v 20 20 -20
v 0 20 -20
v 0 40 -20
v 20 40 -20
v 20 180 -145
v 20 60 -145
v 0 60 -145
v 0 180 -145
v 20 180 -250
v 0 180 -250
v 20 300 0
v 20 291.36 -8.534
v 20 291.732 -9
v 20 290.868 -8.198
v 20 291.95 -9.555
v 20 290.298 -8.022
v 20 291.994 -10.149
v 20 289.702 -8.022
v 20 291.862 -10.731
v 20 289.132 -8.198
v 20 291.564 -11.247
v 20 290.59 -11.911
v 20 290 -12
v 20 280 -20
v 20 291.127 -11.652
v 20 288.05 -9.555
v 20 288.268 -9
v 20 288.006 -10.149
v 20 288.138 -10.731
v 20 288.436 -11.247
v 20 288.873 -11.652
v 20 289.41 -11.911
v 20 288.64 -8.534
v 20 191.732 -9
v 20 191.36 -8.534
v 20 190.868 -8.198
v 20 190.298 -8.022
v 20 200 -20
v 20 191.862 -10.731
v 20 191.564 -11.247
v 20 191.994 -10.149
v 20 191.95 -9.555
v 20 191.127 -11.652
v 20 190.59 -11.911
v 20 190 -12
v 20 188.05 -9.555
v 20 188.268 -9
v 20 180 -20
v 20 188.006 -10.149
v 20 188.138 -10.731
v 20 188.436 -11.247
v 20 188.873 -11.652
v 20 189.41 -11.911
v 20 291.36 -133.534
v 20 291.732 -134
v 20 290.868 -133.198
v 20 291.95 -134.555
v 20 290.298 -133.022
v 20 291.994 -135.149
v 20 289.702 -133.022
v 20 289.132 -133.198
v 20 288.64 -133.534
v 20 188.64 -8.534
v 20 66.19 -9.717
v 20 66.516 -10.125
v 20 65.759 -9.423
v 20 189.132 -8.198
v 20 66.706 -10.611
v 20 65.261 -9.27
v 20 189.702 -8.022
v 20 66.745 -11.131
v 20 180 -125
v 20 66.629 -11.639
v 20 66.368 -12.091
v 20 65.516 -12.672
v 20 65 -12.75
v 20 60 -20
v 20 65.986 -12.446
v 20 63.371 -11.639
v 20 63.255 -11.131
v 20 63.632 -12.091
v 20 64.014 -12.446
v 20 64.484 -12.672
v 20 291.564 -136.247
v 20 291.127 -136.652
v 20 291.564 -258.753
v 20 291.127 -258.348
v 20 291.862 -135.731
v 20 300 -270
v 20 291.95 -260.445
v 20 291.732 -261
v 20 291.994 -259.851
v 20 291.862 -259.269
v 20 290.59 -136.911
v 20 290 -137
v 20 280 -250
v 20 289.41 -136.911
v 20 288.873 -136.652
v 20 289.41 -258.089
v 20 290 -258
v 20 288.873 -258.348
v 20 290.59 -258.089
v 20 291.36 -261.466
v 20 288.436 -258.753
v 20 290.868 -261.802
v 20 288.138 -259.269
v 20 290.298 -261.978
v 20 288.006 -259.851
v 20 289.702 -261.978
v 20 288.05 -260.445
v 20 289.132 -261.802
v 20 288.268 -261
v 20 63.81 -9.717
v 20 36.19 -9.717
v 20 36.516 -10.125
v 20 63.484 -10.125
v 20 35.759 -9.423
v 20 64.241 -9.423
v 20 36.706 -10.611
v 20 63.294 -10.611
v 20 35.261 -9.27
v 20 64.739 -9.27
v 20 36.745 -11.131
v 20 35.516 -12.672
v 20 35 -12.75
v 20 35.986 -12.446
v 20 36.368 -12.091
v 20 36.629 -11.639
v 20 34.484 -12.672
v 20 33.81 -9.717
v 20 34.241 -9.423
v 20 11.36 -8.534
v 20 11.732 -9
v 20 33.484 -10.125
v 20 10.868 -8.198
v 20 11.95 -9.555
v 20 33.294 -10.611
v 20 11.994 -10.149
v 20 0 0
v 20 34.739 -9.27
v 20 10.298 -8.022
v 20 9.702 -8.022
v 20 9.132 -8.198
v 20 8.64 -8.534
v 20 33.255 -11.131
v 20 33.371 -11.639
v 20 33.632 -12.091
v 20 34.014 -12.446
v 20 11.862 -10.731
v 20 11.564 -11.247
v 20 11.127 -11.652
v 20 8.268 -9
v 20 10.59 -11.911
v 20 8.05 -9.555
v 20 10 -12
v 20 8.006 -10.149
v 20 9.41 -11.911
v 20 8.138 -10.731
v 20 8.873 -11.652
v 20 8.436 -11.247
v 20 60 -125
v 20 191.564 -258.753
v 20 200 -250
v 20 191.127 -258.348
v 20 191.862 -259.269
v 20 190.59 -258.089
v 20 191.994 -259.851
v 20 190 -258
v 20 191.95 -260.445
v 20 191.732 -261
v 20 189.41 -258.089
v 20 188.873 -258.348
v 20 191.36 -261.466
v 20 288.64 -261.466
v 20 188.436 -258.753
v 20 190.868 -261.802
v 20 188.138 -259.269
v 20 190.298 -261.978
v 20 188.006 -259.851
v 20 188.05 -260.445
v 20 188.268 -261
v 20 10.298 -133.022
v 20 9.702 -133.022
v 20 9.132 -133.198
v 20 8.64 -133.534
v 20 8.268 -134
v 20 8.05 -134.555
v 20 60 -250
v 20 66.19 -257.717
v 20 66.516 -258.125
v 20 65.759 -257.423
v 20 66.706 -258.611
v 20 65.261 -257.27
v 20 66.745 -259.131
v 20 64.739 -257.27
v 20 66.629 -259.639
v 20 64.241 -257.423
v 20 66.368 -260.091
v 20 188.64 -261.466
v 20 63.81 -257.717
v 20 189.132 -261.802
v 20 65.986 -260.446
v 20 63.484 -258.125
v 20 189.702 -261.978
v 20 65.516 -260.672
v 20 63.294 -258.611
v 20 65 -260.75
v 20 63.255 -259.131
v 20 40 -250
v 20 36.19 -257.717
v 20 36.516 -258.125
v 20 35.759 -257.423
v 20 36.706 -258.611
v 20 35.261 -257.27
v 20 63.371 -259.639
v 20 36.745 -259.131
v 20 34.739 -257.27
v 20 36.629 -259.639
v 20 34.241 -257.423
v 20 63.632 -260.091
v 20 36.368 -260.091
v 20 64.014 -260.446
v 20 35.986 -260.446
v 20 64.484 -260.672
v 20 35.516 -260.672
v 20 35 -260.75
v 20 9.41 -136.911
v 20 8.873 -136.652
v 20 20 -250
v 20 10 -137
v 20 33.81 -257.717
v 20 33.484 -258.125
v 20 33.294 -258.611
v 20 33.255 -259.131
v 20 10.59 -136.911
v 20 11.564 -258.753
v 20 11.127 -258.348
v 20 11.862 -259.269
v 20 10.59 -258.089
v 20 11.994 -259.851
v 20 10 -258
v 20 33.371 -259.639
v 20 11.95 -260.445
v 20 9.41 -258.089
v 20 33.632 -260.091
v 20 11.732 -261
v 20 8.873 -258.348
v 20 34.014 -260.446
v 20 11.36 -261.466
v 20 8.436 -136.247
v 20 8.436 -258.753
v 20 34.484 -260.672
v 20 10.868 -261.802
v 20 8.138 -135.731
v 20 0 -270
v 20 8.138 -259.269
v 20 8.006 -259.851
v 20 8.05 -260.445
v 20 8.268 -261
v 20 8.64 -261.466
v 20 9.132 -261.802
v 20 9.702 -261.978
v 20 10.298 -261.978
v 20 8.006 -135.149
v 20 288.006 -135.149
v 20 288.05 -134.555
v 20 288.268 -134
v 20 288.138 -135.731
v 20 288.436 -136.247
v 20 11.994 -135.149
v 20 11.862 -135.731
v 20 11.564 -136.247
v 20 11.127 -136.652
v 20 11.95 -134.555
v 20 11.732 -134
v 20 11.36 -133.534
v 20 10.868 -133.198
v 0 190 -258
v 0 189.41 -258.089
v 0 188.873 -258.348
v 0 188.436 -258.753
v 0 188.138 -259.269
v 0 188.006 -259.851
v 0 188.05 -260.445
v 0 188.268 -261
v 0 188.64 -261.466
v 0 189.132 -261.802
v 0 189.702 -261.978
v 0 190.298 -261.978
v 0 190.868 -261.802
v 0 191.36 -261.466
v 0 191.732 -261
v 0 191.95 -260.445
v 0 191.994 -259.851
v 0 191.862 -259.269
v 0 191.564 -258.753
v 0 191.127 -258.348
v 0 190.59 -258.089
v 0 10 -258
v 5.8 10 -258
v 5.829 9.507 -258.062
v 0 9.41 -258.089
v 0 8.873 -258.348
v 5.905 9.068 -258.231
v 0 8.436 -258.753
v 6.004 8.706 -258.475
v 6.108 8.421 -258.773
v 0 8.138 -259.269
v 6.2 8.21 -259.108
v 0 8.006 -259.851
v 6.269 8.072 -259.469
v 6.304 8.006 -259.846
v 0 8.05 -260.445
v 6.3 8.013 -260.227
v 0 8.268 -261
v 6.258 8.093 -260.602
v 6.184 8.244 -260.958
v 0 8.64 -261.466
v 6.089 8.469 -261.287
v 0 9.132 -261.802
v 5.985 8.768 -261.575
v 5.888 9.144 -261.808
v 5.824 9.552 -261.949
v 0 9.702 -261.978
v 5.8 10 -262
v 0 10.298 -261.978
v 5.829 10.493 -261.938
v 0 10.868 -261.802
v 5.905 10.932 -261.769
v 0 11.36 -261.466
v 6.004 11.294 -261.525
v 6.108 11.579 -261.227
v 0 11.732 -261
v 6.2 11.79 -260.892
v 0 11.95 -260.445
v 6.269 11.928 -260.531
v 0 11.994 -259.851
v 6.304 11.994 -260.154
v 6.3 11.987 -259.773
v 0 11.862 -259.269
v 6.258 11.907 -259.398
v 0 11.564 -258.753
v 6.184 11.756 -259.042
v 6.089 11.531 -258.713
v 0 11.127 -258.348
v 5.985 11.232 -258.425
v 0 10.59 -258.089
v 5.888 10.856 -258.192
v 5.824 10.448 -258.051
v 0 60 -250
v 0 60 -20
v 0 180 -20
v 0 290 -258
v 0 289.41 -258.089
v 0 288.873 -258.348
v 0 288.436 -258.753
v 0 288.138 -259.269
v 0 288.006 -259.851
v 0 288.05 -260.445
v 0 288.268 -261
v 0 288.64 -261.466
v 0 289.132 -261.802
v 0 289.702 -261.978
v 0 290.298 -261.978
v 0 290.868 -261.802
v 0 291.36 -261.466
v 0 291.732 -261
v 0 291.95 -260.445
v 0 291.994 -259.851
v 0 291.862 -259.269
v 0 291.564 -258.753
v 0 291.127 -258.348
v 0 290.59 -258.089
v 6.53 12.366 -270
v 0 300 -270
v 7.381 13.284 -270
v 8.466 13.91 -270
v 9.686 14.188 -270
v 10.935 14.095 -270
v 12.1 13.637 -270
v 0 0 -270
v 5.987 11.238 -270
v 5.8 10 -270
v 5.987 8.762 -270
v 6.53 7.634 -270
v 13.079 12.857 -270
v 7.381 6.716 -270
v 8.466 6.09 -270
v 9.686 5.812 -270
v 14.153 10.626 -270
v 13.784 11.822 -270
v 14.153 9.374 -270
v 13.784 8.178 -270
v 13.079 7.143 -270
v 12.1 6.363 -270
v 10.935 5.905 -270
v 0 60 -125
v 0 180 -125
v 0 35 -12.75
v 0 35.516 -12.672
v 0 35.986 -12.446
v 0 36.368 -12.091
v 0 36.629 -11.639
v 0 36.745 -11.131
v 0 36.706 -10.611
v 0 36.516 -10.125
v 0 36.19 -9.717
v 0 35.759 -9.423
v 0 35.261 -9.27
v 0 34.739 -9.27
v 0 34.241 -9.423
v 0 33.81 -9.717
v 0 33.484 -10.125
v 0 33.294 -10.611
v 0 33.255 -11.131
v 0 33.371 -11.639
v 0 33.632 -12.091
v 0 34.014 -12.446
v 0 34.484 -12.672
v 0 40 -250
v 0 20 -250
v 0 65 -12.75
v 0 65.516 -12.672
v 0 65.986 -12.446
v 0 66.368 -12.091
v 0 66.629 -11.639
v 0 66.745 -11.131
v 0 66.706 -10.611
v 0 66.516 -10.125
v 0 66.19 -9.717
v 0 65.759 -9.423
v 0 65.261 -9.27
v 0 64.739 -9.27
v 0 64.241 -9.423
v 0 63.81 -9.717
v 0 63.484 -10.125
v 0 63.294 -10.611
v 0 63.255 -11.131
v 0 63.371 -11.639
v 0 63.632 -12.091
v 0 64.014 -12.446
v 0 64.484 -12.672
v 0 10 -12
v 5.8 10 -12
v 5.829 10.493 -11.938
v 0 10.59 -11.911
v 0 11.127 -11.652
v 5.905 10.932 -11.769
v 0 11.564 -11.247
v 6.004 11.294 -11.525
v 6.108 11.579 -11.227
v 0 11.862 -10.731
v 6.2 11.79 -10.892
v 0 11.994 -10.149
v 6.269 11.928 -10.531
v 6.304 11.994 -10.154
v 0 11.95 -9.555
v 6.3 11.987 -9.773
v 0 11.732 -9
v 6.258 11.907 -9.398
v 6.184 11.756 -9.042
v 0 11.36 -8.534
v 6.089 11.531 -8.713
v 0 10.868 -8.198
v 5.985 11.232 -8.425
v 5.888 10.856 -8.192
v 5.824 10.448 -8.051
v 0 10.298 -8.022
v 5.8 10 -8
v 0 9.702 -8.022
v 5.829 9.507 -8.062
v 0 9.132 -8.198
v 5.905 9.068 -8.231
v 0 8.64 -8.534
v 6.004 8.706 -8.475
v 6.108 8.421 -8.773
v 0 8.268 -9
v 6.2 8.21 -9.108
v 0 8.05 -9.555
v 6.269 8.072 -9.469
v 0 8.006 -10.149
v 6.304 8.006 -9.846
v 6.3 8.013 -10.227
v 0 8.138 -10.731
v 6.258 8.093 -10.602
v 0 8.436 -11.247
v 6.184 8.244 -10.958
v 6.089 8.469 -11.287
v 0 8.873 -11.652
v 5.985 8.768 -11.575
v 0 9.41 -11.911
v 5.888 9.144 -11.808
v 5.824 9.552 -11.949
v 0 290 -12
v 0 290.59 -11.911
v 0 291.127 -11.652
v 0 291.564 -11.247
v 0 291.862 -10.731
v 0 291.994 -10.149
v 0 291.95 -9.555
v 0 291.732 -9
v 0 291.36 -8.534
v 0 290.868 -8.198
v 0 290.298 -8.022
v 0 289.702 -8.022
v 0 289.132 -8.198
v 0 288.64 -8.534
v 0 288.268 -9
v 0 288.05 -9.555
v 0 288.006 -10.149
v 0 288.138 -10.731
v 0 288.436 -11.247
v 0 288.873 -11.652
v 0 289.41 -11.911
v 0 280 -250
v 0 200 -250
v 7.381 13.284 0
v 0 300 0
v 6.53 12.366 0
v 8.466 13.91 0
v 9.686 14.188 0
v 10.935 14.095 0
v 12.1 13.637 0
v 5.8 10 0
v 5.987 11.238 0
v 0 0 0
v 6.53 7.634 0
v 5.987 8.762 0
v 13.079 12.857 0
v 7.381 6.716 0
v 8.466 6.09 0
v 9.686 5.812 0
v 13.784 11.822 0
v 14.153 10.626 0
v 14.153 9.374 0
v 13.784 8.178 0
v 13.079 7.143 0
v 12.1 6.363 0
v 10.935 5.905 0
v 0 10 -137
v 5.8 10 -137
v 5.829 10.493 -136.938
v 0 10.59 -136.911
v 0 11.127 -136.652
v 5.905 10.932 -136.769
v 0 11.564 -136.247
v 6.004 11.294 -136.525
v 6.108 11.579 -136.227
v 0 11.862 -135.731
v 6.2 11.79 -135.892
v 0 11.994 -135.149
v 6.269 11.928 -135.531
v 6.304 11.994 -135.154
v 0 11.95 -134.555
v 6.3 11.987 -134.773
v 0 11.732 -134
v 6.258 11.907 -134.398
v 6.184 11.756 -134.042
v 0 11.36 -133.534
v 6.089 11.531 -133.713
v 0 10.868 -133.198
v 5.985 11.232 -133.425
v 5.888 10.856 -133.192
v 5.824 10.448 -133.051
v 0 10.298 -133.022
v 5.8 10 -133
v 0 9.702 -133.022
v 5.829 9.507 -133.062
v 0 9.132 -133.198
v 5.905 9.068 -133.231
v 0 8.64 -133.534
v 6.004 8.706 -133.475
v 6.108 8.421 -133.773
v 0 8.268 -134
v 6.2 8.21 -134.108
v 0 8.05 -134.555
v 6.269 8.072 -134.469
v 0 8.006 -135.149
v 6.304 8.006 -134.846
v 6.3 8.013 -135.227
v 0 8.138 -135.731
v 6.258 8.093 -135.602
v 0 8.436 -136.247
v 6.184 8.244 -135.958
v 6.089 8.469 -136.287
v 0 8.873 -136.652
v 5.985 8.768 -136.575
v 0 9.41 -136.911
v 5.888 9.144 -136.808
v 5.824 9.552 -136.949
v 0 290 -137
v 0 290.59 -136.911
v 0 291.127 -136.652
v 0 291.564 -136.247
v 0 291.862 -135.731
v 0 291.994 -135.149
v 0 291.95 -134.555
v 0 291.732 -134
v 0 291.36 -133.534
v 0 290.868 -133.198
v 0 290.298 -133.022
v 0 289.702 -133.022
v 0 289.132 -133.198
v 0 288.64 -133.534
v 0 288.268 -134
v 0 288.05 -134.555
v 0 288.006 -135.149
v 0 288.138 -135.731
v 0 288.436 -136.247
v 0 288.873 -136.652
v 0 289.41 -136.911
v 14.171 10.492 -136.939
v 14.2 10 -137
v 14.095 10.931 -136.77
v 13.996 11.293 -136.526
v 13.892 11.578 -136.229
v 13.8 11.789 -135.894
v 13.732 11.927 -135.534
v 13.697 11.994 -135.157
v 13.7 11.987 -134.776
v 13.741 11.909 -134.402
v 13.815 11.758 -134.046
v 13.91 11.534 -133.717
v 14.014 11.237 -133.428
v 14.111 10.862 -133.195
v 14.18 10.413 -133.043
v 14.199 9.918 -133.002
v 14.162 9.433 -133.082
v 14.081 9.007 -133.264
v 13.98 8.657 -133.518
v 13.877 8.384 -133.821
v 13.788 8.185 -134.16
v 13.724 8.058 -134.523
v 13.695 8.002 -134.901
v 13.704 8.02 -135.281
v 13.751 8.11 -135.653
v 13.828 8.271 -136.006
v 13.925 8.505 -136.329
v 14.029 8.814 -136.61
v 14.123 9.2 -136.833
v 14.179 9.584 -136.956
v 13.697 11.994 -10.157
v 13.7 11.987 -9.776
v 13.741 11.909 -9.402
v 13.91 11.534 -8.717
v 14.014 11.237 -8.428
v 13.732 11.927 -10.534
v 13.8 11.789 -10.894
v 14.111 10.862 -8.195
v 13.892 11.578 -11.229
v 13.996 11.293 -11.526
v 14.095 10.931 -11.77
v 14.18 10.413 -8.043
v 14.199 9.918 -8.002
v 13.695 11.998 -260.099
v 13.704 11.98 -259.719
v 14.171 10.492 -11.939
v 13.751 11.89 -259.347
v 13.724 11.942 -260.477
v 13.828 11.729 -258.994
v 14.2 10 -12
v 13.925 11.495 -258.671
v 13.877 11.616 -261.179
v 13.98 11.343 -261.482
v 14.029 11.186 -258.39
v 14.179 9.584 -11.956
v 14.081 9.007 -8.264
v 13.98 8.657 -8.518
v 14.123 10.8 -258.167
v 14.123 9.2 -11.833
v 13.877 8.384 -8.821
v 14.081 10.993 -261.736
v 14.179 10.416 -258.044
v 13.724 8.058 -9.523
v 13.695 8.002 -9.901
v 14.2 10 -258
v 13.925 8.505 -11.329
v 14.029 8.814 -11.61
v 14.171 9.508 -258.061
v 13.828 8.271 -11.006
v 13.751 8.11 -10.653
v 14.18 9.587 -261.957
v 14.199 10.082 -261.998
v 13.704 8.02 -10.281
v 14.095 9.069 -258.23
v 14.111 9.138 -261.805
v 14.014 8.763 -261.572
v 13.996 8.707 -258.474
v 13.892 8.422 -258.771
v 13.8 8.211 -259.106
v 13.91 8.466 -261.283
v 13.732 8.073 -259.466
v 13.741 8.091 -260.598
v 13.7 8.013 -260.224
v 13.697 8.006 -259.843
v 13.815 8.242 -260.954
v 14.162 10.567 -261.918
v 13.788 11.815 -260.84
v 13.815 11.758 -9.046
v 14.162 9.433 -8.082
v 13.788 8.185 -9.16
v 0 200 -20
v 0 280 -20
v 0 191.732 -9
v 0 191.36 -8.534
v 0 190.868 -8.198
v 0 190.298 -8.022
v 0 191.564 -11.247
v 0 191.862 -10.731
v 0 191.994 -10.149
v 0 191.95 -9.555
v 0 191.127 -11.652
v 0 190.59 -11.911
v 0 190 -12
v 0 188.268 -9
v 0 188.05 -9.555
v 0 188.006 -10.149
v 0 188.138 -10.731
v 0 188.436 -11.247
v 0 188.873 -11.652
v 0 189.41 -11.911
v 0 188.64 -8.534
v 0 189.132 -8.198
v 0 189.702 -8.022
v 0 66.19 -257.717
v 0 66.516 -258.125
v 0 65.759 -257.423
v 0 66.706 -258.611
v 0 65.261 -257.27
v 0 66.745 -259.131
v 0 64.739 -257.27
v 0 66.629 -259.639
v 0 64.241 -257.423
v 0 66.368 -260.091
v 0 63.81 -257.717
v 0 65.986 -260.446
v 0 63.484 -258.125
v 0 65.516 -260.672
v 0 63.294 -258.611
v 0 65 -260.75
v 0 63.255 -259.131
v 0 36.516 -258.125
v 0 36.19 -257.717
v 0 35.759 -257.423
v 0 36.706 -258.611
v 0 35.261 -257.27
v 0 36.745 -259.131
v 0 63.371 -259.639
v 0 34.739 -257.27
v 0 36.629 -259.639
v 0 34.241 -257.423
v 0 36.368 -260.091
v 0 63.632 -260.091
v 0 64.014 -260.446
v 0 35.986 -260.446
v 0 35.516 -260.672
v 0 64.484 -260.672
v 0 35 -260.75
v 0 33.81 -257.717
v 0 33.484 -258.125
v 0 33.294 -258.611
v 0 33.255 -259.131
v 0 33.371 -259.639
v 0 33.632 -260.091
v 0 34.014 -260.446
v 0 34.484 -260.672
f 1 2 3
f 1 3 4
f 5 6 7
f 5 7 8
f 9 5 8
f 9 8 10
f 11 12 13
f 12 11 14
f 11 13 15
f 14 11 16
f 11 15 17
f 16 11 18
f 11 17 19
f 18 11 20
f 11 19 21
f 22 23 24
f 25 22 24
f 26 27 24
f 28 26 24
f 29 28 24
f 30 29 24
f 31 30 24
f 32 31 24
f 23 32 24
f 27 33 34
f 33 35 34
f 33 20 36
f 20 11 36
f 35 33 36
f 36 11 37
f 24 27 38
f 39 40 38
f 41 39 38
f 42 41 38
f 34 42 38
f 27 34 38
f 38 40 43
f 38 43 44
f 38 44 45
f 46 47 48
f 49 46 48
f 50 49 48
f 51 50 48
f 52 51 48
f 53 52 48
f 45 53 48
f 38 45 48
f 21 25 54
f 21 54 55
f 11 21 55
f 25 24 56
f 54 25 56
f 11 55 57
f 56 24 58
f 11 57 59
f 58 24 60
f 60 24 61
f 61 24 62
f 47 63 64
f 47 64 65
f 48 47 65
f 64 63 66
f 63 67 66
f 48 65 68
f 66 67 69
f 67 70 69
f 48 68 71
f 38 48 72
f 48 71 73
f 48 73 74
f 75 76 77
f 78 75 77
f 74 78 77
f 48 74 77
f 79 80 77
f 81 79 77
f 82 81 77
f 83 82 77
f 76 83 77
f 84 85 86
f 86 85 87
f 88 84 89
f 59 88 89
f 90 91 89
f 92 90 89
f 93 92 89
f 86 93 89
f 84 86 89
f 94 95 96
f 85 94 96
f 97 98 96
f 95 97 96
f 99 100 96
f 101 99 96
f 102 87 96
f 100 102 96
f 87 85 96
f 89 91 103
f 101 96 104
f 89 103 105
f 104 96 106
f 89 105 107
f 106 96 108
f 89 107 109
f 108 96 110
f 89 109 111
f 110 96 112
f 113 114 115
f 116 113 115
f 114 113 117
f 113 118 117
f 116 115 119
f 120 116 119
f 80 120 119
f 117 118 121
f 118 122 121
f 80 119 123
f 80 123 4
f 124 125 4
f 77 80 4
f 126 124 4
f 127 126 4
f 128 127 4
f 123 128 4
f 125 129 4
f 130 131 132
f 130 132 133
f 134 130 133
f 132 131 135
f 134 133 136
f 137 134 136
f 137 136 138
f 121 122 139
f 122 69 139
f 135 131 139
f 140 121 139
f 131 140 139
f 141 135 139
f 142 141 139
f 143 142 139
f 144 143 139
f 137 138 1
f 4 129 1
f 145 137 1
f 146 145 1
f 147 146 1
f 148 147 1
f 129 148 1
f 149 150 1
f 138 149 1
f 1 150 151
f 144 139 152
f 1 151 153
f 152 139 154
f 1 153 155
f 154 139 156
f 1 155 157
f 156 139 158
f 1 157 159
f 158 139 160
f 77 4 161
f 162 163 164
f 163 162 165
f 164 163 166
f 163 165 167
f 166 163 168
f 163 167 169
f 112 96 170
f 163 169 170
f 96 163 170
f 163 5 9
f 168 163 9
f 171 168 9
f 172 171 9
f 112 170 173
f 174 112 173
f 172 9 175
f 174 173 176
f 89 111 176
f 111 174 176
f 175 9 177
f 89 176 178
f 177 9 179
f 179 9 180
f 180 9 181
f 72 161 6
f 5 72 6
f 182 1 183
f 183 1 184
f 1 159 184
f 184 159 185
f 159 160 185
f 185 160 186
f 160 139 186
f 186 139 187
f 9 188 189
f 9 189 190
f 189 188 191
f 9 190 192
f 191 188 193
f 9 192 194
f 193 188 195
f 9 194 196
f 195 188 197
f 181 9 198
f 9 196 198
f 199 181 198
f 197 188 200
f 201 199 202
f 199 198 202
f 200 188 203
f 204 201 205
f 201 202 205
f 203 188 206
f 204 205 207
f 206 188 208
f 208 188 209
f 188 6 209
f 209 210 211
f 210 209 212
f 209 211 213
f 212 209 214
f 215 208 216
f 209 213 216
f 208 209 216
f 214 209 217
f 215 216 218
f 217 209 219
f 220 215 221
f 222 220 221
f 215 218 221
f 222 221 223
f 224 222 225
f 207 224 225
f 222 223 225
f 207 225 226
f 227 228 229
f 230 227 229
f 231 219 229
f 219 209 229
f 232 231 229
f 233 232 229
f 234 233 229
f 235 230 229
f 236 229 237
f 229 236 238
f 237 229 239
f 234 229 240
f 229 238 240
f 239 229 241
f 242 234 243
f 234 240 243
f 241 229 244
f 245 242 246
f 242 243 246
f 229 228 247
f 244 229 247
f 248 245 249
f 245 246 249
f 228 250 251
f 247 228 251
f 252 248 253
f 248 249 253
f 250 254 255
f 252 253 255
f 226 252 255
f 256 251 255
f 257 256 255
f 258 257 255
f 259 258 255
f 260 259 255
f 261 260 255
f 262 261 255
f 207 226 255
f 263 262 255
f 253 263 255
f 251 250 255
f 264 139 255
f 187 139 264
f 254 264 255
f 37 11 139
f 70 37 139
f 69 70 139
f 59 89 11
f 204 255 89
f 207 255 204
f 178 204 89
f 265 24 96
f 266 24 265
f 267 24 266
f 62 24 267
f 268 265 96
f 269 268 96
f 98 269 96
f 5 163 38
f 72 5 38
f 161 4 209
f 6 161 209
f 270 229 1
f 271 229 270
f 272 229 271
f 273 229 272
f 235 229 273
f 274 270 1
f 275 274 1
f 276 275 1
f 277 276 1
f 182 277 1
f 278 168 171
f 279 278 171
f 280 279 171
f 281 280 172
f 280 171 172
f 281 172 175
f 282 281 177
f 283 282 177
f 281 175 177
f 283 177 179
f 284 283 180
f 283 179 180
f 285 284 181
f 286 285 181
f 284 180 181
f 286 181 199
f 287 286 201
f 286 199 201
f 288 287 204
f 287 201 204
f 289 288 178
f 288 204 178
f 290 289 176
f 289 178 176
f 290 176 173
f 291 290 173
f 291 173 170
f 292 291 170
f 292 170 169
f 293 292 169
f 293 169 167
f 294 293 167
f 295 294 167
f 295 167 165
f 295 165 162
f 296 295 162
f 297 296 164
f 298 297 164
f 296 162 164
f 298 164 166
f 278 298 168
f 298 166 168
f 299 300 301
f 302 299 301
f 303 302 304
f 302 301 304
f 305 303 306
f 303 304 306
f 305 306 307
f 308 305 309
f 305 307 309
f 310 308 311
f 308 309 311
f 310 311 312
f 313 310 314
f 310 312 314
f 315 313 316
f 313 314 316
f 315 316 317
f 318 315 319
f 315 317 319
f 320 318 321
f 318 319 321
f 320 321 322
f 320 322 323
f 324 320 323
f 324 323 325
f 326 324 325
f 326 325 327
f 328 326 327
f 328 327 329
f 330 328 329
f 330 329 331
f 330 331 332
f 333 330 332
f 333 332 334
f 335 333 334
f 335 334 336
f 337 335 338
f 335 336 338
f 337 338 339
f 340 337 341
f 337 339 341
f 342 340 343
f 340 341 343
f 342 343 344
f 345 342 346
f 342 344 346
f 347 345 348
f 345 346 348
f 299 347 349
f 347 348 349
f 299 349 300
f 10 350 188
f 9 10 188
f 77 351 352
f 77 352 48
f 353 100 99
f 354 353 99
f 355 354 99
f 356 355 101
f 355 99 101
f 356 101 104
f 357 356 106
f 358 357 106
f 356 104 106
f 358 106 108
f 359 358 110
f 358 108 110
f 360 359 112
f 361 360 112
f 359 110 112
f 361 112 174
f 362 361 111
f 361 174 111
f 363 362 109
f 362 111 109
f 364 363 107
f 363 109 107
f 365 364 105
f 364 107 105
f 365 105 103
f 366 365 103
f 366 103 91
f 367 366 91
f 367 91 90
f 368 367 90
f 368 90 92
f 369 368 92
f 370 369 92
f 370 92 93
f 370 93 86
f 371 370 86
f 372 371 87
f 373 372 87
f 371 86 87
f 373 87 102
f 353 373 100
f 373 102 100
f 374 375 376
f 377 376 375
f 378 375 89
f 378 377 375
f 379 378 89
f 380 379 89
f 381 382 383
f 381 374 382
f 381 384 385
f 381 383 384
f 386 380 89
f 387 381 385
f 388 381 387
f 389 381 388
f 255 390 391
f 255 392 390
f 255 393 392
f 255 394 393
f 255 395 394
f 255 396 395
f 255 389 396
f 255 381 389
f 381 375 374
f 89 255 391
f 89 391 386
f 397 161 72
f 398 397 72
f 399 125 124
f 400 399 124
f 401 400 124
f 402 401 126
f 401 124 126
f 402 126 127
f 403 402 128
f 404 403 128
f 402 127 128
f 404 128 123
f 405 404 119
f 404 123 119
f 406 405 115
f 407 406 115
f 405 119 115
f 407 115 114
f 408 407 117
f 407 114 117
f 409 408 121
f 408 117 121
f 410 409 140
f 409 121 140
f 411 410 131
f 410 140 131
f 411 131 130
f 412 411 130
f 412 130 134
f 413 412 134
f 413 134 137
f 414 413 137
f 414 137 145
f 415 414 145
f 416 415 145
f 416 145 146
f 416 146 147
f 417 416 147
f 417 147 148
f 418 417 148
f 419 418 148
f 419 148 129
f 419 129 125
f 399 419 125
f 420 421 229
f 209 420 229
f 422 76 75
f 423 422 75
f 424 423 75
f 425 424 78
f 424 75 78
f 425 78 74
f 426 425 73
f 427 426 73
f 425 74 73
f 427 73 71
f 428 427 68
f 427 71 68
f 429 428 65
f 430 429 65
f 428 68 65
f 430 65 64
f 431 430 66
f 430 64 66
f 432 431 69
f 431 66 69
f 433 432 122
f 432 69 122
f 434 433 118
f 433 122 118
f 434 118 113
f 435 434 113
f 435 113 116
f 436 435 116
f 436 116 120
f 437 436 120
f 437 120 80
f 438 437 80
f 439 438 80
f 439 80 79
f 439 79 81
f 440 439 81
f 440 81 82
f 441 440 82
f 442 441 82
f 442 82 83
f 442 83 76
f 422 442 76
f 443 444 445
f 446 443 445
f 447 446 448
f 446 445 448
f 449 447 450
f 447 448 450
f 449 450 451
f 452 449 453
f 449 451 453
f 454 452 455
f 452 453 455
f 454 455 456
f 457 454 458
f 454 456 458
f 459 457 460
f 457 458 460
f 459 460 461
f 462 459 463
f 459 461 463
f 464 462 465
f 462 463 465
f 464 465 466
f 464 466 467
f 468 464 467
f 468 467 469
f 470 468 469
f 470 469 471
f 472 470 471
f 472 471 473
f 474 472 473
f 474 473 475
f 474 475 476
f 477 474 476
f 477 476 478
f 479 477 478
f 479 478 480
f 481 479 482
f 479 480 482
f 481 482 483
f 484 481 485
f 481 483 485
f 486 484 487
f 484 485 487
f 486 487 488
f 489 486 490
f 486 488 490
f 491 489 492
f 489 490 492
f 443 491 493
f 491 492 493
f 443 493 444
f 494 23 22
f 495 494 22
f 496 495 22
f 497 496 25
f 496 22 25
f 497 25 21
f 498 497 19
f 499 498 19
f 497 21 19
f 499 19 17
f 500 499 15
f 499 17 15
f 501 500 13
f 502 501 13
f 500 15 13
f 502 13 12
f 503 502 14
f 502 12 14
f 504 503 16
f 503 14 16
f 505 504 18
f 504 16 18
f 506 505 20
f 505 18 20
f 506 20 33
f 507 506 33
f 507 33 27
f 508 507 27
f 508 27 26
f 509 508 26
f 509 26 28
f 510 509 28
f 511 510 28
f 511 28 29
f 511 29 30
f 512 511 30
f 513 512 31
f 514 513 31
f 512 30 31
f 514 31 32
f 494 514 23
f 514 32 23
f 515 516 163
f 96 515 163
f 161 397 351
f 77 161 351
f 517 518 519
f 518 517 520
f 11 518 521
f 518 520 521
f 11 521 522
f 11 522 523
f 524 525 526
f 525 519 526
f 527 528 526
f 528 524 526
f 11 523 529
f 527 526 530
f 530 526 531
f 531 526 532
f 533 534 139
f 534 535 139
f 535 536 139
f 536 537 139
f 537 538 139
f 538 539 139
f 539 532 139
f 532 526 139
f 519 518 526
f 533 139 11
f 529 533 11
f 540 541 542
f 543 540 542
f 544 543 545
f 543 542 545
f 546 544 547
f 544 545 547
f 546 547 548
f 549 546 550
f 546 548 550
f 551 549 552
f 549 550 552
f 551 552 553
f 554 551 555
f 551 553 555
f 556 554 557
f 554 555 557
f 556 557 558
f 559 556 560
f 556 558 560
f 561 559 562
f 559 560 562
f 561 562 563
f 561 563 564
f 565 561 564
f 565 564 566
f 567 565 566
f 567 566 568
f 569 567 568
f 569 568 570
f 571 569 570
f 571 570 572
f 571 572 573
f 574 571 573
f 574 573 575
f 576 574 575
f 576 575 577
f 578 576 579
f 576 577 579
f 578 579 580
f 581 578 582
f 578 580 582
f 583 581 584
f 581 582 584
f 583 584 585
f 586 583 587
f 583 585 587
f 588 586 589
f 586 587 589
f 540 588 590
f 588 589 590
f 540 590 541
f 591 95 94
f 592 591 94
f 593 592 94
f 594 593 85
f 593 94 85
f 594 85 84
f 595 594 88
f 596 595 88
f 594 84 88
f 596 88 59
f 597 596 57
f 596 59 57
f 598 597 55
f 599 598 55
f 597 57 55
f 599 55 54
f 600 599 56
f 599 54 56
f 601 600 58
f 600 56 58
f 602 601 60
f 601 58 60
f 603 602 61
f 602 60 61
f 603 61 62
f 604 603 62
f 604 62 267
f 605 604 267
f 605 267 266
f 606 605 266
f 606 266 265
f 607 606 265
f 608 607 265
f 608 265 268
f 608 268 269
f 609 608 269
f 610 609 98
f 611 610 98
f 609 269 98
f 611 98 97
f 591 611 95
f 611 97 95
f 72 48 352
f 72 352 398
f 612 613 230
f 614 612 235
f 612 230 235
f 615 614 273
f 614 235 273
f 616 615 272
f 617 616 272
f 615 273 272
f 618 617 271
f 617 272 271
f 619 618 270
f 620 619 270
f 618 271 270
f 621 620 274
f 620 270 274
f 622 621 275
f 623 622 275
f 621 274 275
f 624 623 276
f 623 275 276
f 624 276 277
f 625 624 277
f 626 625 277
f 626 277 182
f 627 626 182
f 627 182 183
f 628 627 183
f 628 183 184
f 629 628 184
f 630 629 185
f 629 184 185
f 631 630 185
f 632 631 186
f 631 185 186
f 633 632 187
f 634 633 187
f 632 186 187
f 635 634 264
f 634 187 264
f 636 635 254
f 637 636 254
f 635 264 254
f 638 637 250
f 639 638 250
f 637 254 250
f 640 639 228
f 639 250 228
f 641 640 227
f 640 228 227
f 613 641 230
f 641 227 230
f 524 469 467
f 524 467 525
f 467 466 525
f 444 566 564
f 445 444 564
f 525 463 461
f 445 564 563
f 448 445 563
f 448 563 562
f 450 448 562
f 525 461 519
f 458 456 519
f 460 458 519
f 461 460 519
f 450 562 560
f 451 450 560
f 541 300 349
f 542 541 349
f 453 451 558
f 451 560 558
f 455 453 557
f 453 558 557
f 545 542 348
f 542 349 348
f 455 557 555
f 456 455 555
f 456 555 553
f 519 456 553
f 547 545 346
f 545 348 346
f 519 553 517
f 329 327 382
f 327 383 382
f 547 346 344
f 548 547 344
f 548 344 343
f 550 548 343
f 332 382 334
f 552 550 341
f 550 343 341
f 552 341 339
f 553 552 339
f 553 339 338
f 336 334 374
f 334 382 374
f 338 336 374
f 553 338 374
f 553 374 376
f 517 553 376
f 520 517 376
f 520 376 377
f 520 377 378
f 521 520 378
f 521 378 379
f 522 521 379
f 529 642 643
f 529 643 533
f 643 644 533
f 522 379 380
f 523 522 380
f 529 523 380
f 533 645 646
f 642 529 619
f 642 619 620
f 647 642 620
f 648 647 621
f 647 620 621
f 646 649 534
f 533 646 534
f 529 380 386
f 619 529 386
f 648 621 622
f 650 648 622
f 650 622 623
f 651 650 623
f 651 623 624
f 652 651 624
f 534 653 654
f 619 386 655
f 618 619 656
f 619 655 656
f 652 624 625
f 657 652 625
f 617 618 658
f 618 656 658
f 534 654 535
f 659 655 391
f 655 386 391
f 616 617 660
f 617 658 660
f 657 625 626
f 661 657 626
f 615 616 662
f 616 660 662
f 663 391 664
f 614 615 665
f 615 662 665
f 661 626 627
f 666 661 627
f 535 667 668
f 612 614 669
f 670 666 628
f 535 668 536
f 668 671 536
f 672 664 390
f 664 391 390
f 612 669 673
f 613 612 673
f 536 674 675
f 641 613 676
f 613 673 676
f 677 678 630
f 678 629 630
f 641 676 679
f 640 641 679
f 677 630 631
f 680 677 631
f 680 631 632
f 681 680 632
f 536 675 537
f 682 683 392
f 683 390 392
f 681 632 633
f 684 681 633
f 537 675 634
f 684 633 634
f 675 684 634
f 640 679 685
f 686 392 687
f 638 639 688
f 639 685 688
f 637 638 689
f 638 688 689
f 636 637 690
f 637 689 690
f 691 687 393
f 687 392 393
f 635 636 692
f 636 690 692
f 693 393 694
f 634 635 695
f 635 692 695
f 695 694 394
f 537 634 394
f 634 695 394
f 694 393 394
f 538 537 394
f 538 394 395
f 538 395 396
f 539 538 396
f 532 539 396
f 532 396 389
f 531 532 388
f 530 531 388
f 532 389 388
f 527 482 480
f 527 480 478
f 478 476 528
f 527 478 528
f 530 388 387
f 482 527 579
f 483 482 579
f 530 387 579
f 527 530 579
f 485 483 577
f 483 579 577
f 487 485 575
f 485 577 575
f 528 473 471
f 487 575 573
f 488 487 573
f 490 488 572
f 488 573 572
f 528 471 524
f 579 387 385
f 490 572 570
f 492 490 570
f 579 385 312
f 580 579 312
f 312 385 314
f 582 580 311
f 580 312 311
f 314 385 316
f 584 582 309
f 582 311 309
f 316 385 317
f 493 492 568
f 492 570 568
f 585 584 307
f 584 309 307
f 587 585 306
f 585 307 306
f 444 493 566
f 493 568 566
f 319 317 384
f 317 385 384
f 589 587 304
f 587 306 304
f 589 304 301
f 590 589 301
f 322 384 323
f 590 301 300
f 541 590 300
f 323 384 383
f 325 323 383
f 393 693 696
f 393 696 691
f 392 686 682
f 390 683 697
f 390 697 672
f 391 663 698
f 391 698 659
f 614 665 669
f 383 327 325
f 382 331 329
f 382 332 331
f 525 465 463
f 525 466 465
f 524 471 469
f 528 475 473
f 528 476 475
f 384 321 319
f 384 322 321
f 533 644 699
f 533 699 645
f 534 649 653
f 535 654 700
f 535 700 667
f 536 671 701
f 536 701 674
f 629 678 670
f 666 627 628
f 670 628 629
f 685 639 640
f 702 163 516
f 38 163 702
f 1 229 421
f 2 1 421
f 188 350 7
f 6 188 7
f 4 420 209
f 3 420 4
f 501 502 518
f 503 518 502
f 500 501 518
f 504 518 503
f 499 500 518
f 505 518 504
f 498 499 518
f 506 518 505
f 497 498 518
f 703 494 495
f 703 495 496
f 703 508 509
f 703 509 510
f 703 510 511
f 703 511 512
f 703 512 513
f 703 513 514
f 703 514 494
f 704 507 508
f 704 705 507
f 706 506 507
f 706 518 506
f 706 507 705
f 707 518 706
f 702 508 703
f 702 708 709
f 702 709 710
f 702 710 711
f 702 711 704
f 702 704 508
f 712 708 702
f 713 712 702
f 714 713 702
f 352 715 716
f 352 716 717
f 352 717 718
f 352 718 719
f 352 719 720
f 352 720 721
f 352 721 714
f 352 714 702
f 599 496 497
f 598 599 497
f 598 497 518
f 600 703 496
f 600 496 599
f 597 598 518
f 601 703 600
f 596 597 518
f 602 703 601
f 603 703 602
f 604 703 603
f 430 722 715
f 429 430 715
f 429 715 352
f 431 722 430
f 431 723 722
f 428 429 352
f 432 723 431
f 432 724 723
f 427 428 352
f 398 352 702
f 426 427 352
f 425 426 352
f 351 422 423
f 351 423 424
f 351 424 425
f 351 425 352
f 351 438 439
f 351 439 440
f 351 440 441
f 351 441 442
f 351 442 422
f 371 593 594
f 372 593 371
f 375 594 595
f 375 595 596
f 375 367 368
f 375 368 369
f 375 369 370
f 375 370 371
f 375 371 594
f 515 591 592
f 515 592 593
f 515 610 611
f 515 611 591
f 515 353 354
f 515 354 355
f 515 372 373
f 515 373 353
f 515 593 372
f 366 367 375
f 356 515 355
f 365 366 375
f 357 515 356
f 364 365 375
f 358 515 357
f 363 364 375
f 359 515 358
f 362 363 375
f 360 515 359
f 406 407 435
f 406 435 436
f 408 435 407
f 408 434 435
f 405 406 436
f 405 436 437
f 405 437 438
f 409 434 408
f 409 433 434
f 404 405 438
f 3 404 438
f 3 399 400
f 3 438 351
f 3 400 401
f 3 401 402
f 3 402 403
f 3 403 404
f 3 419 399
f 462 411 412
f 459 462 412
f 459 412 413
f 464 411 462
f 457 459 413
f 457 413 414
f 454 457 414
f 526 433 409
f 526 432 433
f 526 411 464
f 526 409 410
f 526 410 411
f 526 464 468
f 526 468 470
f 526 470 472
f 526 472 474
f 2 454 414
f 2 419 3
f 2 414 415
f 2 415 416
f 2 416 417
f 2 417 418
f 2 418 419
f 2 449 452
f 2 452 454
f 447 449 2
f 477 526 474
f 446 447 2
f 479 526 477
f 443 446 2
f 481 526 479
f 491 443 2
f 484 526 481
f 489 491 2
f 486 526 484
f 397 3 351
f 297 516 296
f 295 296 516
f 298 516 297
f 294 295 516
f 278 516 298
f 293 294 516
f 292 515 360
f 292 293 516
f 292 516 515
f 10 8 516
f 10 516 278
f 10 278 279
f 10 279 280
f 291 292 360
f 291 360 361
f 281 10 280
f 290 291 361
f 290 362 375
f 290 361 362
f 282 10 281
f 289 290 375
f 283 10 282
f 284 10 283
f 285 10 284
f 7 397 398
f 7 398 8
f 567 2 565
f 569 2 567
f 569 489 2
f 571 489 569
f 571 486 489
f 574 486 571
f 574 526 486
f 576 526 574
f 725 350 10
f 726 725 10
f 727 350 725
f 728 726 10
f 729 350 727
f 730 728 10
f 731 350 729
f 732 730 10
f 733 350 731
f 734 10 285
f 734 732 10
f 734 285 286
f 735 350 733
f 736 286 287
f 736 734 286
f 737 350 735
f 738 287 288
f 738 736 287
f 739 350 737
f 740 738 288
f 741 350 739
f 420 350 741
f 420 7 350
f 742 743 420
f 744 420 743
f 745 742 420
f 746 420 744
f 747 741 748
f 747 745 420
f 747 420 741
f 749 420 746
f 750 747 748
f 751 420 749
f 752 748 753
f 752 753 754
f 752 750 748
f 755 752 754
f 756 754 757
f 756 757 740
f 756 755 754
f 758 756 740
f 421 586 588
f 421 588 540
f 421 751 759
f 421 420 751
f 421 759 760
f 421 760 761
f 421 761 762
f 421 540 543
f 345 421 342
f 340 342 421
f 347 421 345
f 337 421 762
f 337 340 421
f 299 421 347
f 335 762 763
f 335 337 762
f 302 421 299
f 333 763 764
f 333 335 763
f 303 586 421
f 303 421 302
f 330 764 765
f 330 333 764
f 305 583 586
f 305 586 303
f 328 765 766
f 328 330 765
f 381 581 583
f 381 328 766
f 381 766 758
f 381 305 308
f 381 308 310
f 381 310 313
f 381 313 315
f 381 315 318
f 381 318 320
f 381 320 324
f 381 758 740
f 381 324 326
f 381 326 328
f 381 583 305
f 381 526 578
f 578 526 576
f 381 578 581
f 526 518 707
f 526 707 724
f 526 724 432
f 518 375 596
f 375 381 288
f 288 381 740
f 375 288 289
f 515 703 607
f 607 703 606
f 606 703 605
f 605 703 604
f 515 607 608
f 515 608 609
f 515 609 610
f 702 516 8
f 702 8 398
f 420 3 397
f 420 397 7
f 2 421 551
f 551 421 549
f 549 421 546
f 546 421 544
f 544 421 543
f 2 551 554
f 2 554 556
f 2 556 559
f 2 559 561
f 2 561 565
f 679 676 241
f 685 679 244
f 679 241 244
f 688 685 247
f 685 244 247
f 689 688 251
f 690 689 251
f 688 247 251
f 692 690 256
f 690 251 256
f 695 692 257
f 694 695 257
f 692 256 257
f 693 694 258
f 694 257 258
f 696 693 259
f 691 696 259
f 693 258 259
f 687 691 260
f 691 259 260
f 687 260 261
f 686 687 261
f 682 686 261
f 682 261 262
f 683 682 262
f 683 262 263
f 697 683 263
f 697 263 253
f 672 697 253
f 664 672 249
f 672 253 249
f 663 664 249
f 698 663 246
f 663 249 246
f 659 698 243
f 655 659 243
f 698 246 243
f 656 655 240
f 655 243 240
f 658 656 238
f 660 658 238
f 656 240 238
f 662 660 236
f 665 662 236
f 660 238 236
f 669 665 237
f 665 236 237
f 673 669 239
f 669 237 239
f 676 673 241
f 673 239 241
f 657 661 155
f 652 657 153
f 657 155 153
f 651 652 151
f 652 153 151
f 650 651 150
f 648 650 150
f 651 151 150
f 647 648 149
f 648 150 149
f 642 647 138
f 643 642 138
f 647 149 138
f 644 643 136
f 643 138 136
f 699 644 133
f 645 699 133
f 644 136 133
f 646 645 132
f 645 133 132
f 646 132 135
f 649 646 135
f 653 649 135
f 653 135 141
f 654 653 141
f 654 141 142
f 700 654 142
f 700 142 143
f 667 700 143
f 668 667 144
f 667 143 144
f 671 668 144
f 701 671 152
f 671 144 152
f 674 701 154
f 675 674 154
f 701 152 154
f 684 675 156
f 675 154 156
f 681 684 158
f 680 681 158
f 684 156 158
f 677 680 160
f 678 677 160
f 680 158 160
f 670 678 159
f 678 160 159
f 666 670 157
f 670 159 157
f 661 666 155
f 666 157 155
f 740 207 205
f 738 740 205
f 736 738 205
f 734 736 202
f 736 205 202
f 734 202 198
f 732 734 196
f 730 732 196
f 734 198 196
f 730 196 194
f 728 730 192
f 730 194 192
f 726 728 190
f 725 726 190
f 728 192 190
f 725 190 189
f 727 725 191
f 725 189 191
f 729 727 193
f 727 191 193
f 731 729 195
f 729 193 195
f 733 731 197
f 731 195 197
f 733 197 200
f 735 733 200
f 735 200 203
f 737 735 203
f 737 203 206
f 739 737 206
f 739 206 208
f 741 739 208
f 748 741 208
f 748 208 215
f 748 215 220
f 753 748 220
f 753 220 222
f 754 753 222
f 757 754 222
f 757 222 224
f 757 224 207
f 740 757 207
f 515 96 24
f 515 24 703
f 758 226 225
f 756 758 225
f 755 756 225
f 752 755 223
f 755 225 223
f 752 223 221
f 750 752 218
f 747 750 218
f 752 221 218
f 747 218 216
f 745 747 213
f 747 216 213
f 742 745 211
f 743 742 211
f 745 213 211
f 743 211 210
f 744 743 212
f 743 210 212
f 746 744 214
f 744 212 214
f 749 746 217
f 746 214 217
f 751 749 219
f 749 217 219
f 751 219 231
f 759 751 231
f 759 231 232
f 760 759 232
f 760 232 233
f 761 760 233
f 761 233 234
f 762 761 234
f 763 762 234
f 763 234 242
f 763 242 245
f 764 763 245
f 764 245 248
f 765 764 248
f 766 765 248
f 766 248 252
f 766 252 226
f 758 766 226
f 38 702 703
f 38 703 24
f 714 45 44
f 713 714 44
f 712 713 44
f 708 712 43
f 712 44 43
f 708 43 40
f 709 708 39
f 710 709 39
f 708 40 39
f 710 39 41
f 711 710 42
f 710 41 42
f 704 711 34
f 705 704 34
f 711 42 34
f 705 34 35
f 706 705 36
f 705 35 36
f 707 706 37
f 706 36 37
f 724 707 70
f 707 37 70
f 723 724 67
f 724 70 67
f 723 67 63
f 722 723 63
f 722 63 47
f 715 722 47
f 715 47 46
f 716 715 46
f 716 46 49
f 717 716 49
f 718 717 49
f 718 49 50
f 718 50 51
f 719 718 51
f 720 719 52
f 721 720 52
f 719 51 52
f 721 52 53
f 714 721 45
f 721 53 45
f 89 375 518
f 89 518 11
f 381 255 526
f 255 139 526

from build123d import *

# Parameters (mm, degrees)
SKETCH3_W           = 20
SKETCH3_H           = 20
BOSS_EXTRUDE1_DEPTH = 300
SKETCH5_W           = 20
SKETCH5_H           = 20
BOSS_EXTRUDE4_DEPTH = 250
SKETCH8_W           = 20
SKETCH8_H           = 20
BOSS_EXTRUDE5_DEPTH = 260
SKETCH13_W          = 230
SKETCH13_H          = 20
BOSS_EXTRUDE7_DEPTH = 20
BOSS_EXTRUDE8_DEPTH = 20
SKETCH15_W          = 20
SKETCH15_H          = 120
BOSS_EXTRUDE9_DEPTH = 20
SKETCH16_R          = 2
CUT_EXTRUDE1_DEPTH  = 20
SKETCH17_R          = 4.2
CUT_EXTRUDE2_DEPTH  = 270
SKETCH19_R          = 1.75
CUT_EXTRUDE3_DEPTH  = 78


with BuildPart() as part:
    # Sketch3 → Boss-Extrude1 (new body)
    with BuildSketch(Plane(origin=(0, 0, 0), x_dir=(1, 0, 0), z_dir=(0, 1, 0))):
        with Locations((10, 10)):
            Rectangle(SKETCH3_W, SKETCH3_H)
    extrude(amount=BOSS_EXTRUDE1_DEPTH)

    # Sketch5 → Boss-Extrude4 (add)
    with BuildSketch(Plane(origin=(0, 0, -20), x_dir=(-1, 0, 0), z_dir=(0, 0, -1))):
        with Locations((-10, 10)):
            Rectangle(SKETCH5_W, SKETCH5_H)
        with Locations((-10, 290)):
            Rectangle(SKETCH5_W, SKETCH5_H)
    extrude(amount=BOSS_EXTRUDE4_DEPTH)

    # Sketch8 → Boss-Extrude5 (add)
    with BuildSketch(Plane(origin=(0, 20, 0), x_dir=(1, 0, 0), z_dir=(0, 1, 0))):
        with Locations((10, 260)):
            Rectangle(SKETCH8_W, SKETCH8_H)
    extrude(amount=BOSS_EXTRUDE5_DEPTH)

    # Sketch13 → Boss-Extrude7 (add)
    with BuildSketch(Plane.ZY):
        with Locations((-135, 50)):
            Rectangle(SKETCH13_W, SKETCH13_H)
    extrude(amount=-BOSS_EXTRUDE7_DEPTH)

    # Sketch14 → Boss-Extrude8 (add)
    with BuildSketch(Plane(origin=(20, 0, 0), x_dir=(0, 0, -1), z_dir=(1, 0, 0))):
        Polygon((125, 200), (20, 200), (20, 180), (125, 180), (145, 180), (250, 180), (250, 200), (145, 200), align=None)
    extrude(amount=-BOSS_EXTRUDE8_DEPTH)

    # Sketch15 → Boss-Extrude9 (add)
    with BuildSketch(Plane(origin=(20, 0, 0), x_dir=(0, 0, -1), z_dir=(1, 0, 0))):
        with Locations((135, 120)):
            Rectangle(SKETCH15_W, SKETCH15_H)
    extrude(amount=-BOSS_EXTRUDE9_DEPTH)

    # Sketch16 → Cut-Extrude1 (cut)
    with BuildSketch(Plane(origin=(20, 0, 0), x_dir=(0, 0, -1), z_dir=(1, 0, 0))):
        with Locations((10, 290)):
            Circle(SKETCH16_R)
        with Locations((10, 190)):
            Circle(SKETCH16_R)
        with Locations((10, 10)):
            Circle(SKETCH16_R)
        with Locations((135, 10)):
            Circle(SKETCH16_R)
        with Locations((135, 290)):
            Circle(SKETCH16_R)
        with Locations(Location((260, 10, 0), (0, 0, 180))):
            Circle(SKETCH16_R)
        with Locations(Location((260, 190, 0), (0, 0, 180))):
            Circle(SKETCH16_R)
        with Locations(Location((260, 290, 0), (0, 0, 180))):
            Circle(SKETCH16_R)
    extrude(amount=-CUT_EXTRUDE1_DEPTH, mode=Mode.SUBTRACT)

    # Sketch17 → Cut-Extrude2 (cut)
    with BuildSketch(Plane(origin=(0, 0, -270), x_dir=(-1, 0, 0), z_dir=(0, 0, -1))):
        with Locations((-10, 10)):
            Circle(SKETCH17_R)
    extrude(amount=-CUT_EXTRUDE2_DEPTH, mode=Mode.SUBTRACT)

    # Sketch19 → Cut-Extrude3 (cut)
    with BuildSketch(Plane(origin=(20, 0, 0), x_dir=(0, 0, -1), z_dir=(1, 0, 0))):
        with Locations((11, 35)):
            Circle(SKETCH19_R)
        with Locations((11, 65)):
            Circle(SKETCH19_R)
        with Locations((259, 35)):
            Circle(SKETCH19_R)
        with Locations((259, 65)):
            Circle(SKETCH19_R)
    extrude(amount=-CUT_EXTRUDE3_DEPTH, mode=Mode.SUBTRACT)


solid = part.part
